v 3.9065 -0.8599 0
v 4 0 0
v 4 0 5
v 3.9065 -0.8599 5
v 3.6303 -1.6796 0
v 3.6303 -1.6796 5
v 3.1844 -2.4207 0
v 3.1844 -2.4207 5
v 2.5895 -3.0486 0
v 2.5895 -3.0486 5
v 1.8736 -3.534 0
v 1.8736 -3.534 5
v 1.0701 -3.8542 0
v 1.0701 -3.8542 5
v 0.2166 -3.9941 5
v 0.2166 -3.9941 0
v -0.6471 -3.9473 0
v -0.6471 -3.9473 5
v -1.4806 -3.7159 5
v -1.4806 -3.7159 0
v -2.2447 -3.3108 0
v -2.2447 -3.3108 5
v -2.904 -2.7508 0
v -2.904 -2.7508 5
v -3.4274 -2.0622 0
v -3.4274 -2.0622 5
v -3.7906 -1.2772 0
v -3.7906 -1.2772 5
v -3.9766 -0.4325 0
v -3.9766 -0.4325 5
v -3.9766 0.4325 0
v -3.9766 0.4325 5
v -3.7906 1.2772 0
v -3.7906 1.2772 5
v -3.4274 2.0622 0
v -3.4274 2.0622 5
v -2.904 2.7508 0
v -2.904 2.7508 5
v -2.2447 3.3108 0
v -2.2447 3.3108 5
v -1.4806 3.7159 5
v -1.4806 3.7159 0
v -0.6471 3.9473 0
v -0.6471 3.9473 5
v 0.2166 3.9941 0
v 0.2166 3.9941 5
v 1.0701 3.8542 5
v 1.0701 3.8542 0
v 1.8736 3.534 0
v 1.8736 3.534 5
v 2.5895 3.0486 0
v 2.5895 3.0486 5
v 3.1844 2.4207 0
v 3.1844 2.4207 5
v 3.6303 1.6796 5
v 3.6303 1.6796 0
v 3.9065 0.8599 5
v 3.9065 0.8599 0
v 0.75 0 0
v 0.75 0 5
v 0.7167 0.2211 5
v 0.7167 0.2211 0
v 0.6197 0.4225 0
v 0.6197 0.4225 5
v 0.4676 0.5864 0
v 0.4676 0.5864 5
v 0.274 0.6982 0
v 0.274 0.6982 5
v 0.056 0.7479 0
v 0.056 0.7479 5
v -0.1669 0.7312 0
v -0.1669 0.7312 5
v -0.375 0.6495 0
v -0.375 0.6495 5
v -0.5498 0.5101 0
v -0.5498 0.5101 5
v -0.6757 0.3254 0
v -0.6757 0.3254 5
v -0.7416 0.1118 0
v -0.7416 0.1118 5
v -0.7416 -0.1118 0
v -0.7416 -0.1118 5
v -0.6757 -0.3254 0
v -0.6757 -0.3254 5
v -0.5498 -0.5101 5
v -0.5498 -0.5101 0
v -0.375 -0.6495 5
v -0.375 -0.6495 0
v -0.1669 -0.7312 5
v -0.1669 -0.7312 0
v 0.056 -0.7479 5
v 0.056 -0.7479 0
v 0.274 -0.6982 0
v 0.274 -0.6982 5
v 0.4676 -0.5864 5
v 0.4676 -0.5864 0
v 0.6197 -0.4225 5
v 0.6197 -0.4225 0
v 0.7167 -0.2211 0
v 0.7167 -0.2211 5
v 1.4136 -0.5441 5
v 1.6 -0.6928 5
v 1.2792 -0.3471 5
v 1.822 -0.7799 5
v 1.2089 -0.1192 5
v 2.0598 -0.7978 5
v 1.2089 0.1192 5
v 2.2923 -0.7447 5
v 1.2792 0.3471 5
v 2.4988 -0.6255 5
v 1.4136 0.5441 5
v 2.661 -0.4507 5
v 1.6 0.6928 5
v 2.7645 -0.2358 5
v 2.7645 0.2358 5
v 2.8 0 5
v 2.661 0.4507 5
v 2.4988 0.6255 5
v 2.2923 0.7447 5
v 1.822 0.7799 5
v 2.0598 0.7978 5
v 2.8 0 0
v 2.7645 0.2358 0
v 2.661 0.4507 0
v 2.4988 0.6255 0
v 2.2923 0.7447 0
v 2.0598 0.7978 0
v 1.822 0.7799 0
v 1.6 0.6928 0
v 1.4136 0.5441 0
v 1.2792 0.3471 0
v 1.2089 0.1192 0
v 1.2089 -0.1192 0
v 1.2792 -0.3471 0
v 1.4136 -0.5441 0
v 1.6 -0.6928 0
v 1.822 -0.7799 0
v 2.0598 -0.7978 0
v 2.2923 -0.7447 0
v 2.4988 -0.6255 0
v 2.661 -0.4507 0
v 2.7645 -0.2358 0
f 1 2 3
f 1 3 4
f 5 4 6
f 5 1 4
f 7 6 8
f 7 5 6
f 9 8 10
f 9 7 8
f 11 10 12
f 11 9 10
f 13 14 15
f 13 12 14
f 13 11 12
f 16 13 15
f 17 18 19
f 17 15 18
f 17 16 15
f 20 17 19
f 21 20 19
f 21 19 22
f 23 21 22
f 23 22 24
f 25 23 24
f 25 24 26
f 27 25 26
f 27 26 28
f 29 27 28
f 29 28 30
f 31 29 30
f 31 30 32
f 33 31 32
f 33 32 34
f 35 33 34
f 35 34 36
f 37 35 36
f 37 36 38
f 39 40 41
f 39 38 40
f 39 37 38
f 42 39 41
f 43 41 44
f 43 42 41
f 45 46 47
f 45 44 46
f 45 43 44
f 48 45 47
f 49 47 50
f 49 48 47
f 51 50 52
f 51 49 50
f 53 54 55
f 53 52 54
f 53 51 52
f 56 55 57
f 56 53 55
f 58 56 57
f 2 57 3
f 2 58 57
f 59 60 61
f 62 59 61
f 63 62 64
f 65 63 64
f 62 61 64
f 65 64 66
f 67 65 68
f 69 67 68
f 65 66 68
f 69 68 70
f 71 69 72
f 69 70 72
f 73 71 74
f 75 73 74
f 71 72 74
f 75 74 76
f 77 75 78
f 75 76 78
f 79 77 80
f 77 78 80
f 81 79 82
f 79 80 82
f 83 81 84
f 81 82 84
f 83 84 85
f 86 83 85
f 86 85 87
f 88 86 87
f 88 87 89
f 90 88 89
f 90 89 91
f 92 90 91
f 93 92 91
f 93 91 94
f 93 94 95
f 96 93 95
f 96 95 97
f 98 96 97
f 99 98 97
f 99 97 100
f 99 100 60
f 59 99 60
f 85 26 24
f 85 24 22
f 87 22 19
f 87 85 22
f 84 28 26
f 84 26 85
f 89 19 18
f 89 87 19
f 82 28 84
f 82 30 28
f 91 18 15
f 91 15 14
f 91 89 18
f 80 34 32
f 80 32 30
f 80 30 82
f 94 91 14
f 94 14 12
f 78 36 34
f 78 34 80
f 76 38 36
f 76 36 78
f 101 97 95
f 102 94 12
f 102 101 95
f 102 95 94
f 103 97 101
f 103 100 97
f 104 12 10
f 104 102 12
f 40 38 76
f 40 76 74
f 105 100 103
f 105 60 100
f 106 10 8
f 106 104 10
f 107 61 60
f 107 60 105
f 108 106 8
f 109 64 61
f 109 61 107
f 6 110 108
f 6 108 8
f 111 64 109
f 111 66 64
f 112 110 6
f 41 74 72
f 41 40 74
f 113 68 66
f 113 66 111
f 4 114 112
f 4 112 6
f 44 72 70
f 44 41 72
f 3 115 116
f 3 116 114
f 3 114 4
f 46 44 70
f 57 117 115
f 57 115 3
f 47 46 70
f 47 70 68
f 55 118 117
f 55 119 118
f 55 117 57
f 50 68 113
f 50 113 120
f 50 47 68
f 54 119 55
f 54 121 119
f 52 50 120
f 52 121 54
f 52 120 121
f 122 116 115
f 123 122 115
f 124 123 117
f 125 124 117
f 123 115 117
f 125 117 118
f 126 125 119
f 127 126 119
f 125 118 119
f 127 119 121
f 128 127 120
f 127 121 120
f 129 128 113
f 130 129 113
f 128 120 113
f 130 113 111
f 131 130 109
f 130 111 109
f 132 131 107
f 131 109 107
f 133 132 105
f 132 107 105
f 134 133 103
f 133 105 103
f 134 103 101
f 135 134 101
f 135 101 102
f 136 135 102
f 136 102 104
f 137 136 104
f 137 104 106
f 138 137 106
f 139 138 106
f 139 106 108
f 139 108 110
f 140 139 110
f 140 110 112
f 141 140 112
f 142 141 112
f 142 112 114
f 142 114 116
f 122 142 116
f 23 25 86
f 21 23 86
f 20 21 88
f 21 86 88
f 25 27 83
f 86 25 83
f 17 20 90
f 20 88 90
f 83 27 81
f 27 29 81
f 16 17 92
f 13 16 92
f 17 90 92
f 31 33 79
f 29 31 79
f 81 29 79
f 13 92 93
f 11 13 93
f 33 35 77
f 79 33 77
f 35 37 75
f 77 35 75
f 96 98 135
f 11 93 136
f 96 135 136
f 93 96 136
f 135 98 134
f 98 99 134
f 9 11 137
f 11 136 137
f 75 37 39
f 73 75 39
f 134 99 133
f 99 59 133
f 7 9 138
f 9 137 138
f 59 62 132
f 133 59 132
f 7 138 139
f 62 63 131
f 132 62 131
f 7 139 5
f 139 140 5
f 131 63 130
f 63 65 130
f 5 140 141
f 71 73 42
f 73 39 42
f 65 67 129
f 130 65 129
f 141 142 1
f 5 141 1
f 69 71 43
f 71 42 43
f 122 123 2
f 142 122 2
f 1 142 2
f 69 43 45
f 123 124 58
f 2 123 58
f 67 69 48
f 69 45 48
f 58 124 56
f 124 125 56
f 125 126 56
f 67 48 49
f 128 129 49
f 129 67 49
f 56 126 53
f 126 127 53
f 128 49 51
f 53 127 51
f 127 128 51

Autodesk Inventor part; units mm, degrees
ref_plane "YZ Plane" through (0, 0, 0) normal (1, 0, 0) x (0, 1, 0)
ref_plane "XZ Plane" through (0, 0, 0) normal (0, 1, 0) x (-1, 0, 0)
ref_plane "XY Plane" through (0, 0, 0) normal (0, 0, 1) x (1, 0, 0)
sketch "Sketch1" plane through (0, 0, 0) normal (0, 0, 1) x (1, 0, 0)
  circle A0 centre (0, 0) radius 4
  dimension "d0" = 8
extrude "Extrusion1" add sketch "Sketch1" along normal blind 5
sketch "Sketch2" plane through (0, 0, 5) normal (0, 0, 1) x (1, 0, 0)
  circle A0 centre (0, 0) radius 0.75
  dimension "d3" = 1.5
extrude "Extrusion2" cut sketch "Sketch2" against normal blind 5
sketch "Sketch3" plane through (0, 0, 5) normal (0, 0, 1) x (1, 0, 0)
  circle A0 centre (2, 0) radius 0.8
  point P0 (0, 0)
  dimension "d6" = 1.6
  dimension "d7" = 0
  dimension "d8" = 2
extrude "Extrusion3" cut sketch "Sketch3" against normal blind 5
thread "Thread1" size "M2x0.4" class "6H" standard "ANSI Metric M Profile" full length
properties part number "MotorArm" material "Aluminum 6061"
